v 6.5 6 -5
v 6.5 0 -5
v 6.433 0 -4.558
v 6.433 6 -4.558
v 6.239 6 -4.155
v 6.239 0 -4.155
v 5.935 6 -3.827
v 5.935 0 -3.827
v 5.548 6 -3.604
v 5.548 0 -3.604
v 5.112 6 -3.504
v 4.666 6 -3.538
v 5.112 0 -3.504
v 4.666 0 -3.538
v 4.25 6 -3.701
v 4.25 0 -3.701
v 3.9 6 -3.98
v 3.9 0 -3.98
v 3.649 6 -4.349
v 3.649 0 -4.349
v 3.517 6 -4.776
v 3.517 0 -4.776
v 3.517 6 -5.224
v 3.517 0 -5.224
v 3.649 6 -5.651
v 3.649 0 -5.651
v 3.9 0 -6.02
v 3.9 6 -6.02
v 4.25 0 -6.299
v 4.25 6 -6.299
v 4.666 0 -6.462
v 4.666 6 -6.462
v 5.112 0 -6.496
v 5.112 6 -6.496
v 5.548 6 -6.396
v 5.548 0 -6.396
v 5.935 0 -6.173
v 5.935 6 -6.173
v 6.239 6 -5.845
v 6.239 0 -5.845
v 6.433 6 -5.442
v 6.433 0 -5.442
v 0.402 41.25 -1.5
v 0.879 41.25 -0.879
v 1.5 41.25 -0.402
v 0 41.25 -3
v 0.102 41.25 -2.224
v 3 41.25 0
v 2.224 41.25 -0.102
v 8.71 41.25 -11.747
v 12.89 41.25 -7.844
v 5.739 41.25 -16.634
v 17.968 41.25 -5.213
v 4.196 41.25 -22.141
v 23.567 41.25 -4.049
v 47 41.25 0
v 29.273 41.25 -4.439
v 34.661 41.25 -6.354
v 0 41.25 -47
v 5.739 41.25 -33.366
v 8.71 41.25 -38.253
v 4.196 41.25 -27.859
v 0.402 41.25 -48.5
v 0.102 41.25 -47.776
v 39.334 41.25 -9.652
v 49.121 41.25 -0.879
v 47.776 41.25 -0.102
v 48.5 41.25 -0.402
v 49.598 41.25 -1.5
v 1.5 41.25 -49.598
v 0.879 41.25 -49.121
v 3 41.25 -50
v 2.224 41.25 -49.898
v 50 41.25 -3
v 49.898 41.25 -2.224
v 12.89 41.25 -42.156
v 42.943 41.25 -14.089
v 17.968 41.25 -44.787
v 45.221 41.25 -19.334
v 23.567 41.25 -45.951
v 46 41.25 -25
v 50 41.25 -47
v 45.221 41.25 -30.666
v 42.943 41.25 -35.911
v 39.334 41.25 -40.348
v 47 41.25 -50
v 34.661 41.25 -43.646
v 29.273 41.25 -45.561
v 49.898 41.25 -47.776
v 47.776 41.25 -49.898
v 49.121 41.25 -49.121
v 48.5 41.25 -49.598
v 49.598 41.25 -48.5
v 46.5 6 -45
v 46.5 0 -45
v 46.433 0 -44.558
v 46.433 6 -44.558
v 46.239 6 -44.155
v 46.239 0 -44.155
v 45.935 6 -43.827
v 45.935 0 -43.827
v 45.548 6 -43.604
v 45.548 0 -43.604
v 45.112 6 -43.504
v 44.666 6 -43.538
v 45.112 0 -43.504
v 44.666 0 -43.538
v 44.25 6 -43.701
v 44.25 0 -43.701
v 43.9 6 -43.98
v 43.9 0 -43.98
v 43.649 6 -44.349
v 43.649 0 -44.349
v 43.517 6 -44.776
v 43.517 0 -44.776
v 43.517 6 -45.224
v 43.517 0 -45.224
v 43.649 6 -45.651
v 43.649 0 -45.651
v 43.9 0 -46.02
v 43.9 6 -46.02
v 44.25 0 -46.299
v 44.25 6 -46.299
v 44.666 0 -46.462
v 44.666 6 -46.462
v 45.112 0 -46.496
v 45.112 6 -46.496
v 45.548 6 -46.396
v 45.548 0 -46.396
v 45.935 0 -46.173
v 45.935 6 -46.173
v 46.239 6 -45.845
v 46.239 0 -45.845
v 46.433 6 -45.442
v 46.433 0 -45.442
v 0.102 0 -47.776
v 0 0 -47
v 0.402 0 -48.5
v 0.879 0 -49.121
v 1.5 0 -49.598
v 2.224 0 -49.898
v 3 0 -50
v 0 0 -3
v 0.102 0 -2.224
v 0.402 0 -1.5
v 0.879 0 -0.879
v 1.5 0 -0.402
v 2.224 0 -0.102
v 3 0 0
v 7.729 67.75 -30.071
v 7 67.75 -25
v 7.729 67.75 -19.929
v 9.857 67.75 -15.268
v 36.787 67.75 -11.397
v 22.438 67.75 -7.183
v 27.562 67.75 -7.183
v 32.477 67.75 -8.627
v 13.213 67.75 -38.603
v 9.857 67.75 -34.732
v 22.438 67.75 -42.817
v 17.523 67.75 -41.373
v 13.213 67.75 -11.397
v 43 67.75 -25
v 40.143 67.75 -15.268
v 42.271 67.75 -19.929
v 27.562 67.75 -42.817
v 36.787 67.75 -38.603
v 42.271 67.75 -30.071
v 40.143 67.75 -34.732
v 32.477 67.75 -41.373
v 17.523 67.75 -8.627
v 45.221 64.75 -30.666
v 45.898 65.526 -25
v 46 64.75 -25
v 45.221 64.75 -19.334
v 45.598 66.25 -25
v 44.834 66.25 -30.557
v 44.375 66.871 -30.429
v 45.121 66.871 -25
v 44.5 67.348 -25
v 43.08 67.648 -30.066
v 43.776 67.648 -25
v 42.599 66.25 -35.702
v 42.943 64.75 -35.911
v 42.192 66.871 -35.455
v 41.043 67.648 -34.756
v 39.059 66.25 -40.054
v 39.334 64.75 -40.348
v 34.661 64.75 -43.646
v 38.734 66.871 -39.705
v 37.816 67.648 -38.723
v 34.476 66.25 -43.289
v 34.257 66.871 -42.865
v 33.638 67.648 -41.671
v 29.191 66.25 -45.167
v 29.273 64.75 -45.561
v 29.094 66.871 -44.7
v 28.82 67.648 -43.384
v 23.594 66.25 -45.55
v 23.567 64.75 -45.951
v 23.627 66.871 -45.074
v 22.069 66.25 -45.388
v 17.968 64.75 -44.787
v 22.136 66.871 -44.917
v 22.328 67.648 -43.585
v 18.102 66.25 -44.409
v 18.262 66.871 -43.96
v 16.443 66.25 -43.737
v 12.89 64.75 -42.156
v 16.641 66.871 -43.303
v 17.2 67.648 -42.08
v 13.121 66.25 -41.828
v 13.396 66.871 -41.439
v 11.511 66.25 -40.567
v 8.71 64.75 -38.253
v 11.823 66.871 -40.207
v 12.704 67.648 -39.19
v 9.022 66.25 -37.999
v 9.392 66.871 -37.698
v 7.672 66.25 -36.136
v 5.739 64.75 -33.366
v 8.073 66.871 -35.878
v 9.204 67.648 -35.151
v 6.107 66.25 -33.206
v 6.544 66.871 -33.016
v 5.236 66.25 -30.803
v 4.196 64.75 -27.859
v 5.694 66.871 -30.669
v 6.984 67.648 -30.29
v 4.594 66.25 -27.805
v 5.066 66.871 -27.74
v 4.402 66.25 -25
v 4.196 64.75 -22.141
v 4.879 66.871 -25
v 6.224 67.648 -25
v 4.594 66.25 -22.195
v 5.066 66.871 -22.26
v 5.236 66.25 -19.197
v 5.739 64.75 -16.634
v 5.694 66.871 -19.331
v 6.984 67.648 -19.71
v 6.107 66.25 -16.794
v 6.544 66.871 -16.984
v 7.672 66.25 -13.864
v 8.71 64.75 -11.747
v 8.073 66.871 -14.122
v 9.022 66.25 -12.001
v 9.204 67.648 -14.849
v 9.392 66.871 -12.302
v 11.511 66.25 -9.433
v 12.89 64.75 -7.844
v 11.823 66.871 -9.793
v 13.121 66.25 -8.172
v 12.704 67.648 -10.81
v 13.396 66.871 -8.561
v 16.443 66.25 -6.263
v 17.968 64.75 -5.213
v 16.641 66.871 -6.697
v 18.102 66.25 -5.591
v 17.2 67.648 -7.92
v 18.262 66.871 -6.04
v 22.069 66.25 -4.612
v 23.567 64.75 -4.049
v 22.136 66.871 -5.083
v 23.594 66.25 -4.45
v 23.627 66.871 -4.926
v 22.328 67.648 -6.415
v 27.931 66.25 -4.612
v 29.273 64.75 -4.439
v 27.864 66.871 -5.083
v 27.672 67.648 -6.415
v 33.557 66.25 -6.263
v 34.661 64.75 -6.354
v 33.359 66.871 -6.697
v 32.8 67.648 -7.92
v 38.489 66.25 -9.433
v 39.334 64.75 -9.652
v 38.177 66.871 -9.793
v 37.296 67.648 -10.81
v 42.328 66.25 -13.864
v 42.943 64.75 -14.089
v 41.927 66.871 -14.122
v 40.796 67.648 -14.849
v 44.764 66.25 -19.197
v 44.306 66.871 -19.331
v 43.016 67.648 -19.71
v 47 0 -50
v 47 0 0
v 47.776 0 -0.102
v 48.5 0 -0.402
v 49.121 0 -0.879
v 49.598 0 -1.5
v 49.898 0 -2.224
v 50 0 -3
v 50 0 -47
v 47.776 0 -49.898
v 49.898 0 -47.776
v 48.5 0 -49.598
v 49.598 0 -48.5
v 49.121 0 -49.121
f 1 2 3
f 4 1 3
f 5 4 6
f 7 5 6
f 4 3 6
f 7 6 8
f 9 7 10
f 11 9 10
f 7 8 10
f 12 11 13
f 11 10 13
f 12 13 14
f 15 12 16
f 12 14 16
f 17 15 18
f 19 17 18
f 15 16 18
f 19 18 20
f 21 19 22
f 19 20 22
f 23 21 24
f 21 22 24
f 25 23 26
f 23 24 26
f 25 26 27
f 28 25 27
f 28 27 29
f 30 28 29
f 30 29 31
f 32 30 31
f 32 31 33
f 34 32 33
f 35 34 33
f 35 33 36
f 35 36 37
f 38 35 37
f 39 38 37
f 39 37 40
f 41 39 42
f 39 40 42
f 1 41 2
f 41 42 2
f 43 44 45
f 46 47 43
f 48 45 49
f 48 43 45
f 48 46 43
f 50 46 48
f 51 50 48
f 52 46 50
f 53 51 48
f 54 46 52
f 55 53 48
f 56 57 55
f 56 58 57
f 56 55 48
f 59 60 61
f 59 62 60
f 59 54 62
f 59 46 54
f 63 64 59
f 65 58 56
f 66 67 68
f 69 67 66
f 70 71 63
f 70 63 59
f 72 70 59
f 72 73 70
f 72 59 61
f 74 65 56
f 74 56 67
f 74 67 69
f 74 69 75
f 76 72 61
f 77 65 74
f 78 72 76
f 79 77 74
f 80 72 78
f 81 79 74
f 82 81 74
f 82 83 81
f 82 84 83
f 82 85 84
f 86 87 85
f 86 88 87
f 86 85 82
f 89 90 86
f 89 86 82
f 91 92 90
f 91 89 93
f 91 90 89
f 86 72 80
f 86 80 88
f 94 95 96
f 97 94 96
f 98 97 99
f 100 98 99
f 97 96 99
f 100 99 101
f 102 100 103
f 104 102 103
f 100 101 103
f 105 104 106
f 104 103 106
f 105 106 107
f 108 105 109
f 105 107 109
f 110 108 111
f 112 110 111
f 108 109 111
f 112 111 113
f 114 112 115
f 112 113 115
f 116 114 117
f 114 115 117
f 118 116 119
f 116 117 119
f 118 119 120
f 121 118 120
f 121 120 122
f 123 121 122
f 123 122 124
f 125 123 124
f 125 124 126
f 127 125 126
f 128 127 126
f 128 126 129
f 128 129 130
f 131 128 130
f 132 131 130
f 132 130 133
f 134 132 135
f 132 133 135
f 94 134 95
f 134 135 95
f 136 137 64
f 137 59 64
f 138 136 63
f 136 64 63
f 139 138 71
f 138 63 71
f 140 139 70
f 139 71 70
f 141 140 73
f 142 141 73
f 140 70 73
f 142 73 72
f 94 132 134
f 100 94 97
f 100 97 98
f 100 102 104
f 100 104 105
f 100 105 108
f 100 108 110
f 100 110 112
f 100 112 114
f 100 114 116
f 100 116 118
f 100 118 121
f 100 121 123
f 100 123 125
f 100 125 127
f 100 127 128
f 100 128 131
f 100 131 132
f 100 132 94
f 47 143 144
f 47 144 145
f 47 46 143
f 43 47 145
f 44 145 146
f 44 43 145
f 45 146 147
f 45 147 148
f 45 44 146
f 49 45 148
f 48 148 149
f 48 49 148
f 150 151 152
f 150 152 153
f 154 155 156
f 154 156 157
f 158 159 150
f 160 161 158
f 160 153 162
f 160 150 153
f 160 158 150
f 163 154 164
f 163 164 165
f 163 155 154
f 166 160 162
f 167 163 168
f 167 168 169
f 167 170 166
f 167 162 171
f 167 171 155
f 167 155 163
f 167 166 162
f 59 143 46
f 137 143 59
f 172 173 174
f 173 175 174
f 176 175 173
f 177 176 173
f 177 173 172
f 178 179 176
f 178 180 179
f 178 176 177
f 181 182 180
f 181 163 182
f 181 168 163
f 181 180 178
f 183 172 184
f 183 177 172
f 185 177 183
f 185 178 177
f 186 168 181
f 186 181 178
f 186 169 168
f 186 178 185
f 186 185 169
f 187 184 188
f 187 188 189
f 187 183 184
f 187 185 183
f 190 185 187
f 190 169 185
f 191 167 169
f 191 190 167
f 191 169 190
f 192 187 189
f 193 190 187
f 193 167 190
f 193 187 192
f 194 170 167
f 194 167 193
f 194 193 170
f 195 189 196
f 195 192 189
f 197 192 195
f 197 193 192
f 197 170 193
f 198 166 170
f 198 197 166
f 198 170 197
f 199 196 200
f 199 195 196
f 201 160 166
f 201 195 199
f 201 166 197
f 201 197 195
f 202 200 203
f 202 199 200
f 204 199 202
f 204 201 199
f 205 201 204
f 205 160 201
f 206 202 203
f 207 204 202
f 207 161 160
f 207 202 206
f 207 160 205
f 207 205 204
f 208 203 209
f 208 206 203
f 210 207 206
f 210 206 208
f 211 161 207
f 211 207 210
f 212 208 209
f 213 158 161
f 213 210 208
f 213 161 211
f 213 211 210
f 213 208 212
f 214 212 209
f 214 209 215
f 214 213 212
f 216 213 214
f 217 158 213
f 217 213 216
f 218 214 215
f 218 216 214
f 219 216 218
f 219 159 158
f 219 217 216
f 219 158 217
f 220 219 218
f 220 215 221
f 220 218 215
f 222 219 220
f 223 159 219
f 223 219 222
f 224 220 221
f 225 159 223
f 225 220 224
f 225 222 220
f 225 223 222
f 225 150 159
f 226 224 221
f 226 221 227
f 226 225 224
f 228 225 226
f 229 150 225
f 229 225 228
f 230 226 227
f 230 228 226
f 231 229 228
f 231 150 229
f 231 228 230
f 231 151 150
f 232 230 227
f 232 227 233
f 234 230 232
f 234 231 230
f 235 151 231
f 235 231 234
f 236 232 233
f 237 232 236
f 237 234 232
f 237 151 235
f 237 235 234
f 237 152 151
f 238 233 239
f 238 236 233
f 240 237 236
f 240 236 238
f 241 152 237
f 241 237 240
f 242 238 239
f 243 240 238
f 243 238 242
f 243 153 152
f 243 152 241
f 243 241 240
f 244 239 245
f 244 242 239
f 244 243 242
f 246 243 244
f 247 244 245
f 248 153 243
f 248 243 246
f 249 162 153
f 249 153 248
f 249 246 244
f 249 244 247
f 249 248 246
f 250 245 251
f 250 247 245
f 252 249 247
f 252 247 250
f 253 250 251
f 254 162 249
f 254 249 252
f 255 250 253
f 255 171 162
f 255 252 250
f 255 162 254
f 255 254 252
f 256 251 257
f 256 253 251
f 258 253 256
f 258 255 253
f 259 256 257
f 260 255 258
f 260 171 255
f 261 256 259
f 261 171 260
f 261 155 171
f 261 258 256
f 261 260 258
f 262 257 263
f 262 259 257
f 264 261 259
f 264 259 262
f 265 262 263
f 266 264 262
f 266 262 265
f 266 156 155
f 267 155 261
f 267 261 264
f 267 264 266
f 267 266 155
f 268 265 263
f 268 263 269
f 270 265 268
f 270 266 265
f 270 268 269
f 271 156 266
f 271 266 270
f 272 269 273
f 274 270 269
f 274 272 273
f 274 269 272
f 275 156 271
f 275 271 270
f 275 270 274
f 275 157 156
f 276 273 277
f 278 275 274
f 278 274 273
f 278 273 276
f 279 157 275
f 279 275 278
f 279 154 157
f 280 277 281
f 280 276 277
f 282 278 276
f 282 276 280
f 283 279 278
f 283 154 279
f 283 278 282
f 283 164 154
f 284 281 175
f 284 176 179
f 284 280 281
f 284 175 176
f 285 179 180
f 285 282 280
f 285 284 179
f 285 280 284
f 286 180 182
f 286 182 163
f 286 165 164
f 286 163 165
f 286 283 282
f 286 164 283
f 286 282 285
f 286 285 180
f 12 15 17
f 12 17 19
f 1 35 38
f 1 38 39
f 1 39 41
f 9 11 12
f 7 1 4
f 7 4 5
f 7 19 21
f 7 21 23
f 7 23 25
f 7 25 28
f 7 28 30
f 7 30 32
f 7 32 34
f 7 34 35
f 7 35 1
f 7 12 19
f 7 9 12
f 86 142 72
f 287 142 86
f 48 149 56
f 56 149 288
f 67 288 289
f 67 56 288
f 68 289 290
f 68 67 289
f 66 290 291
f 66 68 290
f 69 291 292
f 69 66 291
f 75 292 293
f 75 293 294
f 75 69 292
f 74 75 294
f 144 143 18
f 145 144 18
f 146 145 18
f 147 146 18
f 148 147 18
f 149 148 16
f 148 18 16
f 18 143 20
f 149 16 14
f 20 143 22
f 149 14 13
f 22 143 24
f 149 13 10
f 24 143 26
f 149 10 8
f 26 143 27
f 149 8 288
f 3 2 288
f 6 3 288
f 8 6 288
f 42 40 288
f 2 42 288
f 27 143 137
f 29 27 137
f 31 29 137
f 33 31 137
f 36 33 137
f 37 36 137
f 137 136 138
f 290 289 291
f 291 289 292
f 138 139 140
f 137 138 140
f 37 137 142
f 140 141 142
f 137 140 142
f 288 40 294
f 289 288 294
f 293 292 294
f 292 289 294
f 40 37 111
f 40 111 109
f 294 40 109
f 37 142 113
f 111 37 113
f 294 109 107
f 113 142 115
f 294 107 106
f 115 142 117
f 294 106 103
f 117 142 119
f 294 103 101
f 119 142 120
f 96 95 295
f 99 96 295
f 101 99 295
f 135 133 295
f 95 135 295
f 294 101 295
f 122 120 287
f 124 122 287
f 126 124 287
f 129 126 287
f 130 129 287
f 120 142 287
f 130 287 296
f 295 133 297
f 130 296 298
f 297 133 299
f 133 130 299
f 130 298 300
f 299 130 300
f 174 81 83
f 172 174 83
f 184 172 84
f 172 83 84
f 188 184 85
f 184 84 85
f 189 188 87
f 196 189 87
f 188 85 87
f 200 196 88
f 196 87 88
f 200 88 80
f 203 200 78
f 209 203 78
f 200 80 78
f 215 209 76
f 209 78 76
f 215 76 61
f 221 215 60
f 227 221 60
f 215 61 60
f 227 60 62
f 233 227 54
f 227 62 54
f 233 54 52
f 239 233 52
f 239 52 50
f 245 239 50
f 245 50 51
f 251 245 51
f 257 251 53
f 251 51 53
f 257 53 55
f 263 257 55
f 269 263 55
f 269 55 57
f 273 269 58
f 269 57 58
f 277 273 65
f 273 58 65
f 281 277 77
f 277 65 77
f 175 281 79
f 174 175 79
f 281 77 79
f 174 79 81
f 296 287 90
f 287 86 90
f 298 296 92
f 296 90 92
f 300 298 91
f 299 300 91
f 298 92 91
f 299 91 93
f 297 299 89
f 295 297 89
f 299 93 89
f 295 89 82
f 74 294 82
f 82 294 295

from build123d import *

# Parameters (mm, degrees)
SKETCH1_W           = 50
SKETCH1_H           = 50
BOSS_EXTRUDE1_DEPTH = 41.25
SKETCH2_R           = 1.5
CUT_EXTRUDE1_DEPTH  = 6
SKETCH3_R           = 21
BOSS_EXTRUDE2_DEPTH = 26.5
FILLET1_R           = 3


with BuildPart() as part:
    # Sketch1 → Boss-Extrude1 (new body)
    with BuildSketch(Plane(origin=(0, 0, 0), x_dir=(1, 0, 0), z_dir=(0, 1, 0))):
        with Locations((25, 25)):
            Rectangle(SKETCH1_W, SKETCH1_H)
    extrude(amount=BOSS_EXTRUDE1_DEPTH)

    # Sketch2 → Cut-Extrude1 (cut)
    with BuildSketch(Plane.XZ):
        with Locations((5, -5)):
            Circle(SKETCH2_R)
        with Locations((45, -45)):
            Circle(SKETCH2_R)
    extrude(amount=-CUT_EXTRUDE1_DEPTH, mode=Mode.SUBTRACT)

    # Sketch3 → Boss-Extrude2 (add)
    with BuildSketch(Plane(origin=(0, 41.25, 0), x_dir=(1, 0, 0), z_dir=(0, 1, 0))):
        with Locations((25, 25)):
            Circle(SKETCH3_R)
    extrude(amount=BOSS_EXTRUDE2_DEPTH)

    # Fillet1
    fillet1_edges = [part.edges().sort_by_distance(p)[0] for p in [
        (4, 67.75, -25),
        (0, 20.625, 0),
        (50, 20.625, 0),
        (50, 20.625, -50),
        (0, 20.625, -50),
    ]]
    fillet(fillet1_edges, radius=FILLET1_R)


solid = part.part
